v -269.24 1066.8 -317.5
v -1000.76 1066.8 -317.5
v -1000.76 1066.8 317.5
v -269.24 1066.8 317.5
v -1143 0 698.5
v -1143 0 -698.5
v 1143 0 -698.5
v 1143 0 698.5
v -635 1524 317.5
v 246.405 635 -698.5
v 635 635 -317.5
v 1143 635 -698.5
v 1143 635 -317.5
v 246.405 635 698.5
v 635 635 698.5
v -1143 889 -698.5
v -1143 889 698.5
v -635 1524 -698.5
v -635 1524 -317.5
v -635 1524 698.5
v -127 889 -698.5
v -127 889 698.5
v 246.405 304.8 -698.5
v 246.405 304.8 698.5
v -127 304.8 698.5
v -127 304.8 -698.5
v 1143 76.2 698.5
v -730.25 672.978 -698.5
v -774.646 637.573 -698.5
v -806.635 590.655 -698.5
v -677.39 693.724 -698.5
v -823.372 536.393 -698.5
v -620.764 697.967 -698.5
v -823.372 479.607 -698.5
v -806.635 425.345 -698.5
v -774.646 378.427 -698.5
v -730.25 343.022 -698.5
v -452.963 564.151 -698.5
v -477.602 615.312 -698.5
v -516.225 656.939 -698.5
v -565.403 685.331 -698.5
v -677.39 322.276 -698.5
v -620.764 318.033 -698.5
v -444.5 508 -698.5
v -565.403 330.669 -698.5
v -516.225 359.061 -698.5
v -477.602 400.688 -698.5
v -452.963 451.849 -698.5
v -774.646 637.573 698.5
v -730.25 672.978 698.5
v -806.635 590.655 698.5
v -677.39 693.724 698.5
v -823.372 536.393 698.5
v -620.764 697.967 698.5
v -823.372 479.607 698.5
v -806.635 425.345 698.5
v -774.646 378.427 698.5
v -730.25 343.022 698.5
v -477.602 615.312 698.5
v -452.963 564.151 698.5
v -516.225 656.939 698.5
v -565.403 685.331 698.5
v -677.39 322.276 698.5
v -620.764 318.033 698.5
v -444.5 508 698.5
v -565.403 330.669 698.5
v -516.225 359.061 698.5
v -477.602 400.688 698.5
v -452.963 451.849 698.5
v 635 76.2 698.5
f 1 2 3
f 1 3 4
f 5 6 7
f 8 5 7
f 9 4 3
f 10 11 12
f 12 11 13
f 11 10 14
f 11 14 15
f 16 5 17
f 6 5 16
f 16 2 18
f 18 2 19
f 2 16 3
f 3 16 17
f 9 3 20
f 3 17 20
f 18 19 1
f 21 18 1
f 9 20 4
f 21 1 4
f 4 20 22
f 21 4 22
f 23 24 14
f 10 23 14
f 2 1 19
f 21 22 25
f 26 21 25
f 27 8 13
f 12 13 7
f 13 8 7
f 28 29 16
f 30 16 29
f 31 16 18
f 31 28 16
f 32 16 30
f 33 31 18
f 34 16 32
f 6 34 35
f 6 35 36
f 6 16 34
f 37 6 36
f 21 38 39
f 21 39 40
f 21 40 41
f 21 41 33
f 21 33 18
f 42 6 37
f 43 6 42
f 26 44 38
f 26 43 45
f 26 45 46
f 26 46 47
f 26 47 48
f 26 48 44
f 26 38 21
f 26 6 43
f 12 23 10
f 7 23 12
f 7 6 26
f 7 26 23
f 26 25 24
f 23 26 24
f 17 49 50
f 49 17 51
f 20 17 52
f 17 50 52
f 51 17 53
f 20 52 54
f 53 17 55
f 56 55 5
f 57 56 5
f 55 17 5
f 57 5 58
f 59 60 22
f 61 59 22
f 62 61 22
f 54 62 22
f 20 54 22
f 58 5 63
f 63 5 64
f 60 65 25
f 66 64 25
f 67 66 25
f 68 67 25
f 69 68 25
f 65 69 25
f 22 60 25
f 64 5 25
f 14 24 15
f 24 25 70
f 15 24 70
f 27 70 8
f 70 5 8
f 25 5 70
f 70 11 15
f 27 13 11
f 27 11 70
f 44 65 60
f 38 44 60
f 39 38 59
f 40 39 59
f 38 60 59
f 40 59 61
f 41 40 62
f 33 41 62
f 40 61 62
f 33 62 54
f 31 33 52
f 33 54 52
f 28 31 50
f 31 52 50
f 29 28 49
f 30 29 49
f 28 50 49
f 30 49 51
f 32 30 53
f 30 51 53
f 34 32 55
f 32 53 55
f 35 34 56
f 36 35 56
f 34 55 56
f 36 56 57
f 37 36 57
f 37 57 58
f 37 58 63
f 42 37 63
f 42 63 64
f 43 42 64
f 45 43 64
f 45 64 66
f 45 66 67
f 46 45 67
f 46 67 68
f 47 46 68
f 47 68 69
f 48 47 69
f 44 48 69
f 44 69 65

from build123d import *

# Parameters (mm, degrees)
SKETCH1_W               = 2286
SKETCH1_H               = 1397
BOSS_EXTRUDE1_DEPTH     = 1524
CUT_EXTRUDE7_DEPTH      = 1
CUT_EXTRUDE7_DEPTH_BACK = 1397
SKETCH3_R               = 190.5
CUT_EXTRUDE8_DEPTH      = 1398
CUT_EXTRUDE9_DEPTH      = 317.5
CUT_EXTRUDE9_DEPTH_BACK = 317.5
CUT_EXTRUDE10_DEPTH     = 508


with BuildPart() as part:
    # Sketch1 → Boss-Extrude1 (new body)
    with BuildSketch(Plane(origin=(0, 0, 0), x_dir=(1, 0, 0), z_dir=(0, 1, 0))):
        Rectangle(SKETCH1_W, SKETCH1_H)
    extrude(amount=BOSS_EXTRUDE1_DEPTH)

    # Sketch2 → Cut-Extrude7 (cut, two sides)
    with BuildSketch(Plane.XY.offset(698.5)) as cut_extrude7_sk:
        Polygon((-4213.722746177, -2949.403432721), (-1143, 889), (-635, 1524), (-127, 889), (-127, 304.8), (246.405498816, 304.8), (246.405498816, 635), (1143, 635), (6058.55481062, 635), (2819.614537591, 9917.240154866), (-7452.663019206, 6332.836722145), align=None)
    extrude(amount=CUT_EXTRUDE7_DEPTH, mode=Mode.SUBTRACT)
    extrude(cut_extrude7_sk.sketch, amount=-CUT_EXTRUDE7_DEPTH_BACK, mode=Mode.SUBTRACT)

    # Sketch3 → Cut-Extrude8 (cut, through all)
    with BuildSketch(Plane.XY.offset(698.5)):
        with Locations((-635, 508)):
            Circle(SKETCH3_R)
    extrude(amount=-CUT_EXTRUDE8_DEPTH, mode=Mode.SUBTRACT)

    # Sketch8 → Cut-Extrude9 (cut, two sides)
    with BuildSketch(Plane.XY) as cut_extrude9_sk:
        Polygon((-635, 1066.8), (-1000.76, 1066.8), (-635, 1524), (-269.24, 1066.8), align=None)
    extrude(amount=CUT_EXTRUDE9_DEPTH, mode=Mode.SUBTRACT)
    extrude(cut_extrude9_sk.sketch, amount=-CUT_EXTRUDE9_DEPTH_BACK, mode=Mode.SUBTRACT)

    # Sketch9 → Cut-Extrude10 (cut)
    with BuildSketch(Plane(origin=(1143, 0, 0), x_dir=(0, 0, -1), z_dir=(1, 0, 0))):
        Polygon((317.5, 635), (-698.5, 76.2), (-698.5, 635), align=None)
    extrude(amount=-CUT_EXTRUDE10_DEPTH, mode=Mode.SUBTRACT)


solid = part.part
